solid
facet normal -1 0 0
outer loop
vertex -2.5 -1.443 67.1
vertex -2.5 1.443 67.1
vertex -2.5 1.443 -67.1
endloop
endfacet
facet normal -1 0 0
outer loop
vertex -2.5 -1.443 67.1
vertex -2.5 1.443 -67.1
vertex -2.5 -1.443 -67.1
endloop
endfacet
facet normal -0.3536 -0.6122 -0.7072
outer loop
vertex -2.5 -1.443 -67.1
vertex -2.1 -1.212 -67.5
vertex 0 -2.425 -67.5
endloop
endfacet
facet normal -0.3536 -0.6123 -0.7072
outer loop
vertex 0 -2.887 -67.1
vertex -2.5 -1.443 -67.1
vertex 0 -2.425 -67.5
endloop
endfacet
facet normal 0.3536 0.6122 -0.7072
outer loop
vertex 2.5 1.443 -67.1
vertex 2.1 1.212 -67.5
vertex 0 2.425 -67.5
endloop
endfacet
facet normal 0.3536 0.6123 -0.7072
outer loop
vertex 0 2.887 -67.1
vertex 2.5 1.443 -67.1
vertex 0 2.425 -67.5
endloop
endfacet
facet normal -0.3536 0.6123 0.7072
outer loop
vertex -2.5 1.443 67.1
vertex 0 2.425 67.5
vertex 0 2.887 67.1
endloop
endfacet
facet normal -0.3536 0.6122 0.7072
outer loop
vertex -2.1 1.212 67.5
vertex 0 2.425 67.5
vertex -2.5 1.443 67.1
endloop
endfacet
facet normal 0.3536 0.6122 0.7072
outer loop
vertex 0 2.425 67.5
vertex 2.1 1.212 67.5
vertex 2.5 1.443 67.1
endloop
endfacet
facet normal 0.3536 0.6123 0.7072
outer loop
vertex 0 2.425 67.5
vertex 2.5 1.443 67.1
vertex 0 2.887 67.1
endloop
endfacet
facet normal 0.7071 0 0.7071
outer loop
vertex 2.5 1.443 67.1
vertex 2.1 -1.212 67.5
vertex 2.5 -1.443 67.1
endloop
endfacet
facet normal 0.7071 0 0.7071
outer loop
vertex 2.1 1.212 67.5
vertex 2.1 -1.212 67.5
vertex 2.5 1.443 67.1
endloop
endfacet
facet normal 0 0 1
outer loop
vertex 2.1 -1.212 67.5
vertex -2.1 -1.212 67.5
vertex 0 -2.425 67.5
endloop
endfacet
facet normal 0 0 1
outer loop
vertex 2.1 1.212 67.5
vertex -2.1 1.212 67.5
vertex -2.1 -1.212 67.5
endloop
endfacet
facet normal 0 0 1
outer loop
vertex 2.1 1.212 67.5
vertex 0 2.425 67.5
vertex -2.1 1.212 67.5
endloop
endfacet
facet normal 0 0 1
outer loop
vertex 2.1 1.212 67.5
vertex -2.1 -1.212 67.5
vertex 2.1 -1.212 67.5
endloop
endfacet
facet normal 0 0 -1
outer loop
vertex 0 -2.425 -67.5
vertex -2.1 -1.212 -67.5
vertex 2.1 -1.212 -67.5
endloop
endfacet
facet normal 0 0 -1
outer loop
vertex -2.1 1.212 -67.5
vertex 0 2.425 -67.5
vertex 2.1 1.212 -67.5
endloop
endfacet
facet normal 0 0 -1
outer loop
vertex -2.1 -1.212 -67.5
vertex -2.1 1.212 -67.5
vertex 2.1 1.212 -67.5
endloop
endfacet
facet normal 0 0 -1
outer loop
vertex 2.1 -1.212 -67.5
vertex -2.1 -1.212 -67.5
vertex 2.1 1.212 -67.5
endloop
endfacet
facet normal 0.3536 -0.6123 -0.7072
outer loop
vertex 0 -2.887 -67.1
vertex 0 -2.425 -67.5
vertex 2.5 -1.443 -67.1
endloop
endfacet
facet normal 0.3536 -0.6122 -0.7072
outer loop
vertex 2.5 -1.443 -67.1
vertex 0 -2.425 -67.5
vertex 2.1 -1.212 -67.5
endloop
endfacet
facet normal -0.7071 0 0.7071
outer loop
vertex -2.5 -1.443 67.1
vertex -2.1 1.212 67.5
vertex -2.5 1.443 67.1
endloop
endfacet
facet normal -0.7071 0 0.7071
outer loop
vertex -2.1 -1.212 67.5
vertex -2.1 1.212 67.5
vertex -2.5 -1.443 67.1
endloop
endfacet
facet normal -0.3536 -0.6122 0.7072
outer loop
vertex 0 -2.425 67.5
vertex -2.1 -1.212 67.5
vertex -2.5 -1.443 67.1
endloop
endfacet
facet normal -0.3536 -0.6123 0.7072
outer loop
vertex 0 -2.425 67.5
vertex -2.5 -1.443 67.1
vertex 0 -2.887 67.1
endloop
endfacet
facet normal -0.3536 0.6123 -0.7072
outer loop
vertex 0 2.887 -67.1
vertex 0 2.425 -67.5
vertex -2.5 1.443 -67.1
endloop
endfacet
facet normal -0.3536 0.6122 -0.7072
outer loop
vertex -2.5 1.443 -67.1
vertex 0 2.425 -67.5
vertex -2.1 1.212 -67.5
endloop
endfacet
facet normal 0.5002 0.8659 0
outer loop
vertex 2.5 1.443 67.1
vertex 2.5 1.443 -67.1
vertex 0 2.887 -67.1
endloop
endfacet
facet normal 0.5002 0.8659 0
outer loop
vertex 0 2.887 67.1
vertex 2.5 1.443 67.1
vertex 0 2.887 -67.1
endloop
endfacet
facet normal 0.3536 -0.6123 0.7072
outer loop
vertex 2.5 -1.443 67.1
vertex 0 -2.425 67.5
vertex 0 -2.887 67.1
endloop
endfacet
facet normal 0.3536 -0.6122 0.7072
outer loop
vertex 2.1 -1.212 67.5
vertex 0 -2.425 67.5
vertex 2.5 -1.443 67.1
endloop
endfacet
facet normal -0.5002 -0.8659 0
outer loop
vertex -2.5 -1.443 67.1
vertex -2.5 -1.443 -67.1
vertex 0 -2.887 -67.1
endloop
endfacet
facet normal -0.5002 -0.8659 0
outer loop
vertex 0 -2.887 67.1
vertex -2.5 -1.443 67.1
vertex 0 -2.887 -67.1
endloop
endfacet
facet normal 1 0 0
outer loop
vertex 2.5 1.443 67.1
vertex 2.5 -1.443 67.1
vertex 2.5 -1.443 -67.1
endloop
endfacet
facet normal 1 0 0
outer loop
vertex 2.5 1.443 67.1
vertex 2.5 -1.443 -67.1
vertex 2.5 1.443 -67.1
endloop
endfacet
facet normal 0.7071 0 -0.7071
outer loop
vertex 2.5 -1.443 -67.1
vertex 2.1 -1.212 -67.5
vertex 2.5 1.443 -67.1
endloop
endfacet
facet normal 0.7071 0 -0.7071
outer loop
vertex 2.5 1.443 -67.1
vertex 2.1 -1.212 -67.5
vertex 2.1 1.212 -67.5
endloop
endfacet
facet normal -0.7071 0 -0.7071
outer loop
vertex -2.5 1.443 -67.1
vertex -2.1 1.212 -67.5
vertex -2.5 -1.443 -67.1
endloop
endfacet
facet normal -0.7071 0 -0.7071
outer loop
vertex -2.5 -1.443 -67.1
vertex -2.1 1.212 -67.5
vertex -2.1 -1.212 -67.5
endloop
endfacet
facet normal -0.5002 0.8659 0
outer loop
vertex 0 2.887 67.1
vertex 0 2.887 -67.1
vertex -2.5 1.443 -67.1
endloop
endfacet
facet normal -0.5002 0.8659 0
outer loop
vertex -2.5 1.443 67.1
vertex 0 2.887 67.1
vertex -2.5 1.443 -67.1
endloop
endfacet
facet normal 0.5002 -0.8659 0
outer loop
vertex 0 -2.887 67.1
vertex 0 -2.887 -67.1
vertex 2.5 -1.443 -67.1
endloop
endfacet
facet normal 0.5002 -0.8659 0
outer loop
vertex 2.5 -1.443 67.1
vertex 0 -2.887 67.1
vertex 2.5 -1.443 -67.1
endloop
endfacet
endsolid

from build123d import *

# Parameters (mm, degrees)
BOSS_EXTRUDE1_DEPTH = 135
CHAMFER1_SIZE       = 0.4


with BuildPart() as part:
    # Sketch1 → Boss-Extrude1 (new body)
    with BuildSketch(Plane.XY.offset(67.5)):
        Polygon((0, -2.886751346), (2.5, -1.443375673), (2.5, 1.443375673), (0, 2.886751346), (-2.5, 1.443375673), (-2.5, -1.443375673), align=None)
    extrude(amount=-BOSS_EXTRUDE1_DEPTH)

    # Chamfer1
    chamfer1_edges = [part.edges().sort_by_distance(p)[0] for p in [
        (2.5, 0, -67.5),
        (1.25, 2.165063509, -67.5),
        (-1.25, 2.165063509, -67.5),
        (-2.5, 0, -67.5),
        (-1.25, -2.165063509, -67.5),
        (-2.5, 0, 67.5),
        (-1.25, 2.165063509, 67.5),
        (1.25, 2.165063509, 67.5),
        (1.25, -2.165063509, -67.5),
        (2.5, 0, 67.5),
        (1.25, -2.165063509, 67.5),
        (-1.25, -2.165063509, 67.5),
    ]]
    chamfer(chamfer1_edges, length=CHAMFER1_SIZE)


solid = part.part
